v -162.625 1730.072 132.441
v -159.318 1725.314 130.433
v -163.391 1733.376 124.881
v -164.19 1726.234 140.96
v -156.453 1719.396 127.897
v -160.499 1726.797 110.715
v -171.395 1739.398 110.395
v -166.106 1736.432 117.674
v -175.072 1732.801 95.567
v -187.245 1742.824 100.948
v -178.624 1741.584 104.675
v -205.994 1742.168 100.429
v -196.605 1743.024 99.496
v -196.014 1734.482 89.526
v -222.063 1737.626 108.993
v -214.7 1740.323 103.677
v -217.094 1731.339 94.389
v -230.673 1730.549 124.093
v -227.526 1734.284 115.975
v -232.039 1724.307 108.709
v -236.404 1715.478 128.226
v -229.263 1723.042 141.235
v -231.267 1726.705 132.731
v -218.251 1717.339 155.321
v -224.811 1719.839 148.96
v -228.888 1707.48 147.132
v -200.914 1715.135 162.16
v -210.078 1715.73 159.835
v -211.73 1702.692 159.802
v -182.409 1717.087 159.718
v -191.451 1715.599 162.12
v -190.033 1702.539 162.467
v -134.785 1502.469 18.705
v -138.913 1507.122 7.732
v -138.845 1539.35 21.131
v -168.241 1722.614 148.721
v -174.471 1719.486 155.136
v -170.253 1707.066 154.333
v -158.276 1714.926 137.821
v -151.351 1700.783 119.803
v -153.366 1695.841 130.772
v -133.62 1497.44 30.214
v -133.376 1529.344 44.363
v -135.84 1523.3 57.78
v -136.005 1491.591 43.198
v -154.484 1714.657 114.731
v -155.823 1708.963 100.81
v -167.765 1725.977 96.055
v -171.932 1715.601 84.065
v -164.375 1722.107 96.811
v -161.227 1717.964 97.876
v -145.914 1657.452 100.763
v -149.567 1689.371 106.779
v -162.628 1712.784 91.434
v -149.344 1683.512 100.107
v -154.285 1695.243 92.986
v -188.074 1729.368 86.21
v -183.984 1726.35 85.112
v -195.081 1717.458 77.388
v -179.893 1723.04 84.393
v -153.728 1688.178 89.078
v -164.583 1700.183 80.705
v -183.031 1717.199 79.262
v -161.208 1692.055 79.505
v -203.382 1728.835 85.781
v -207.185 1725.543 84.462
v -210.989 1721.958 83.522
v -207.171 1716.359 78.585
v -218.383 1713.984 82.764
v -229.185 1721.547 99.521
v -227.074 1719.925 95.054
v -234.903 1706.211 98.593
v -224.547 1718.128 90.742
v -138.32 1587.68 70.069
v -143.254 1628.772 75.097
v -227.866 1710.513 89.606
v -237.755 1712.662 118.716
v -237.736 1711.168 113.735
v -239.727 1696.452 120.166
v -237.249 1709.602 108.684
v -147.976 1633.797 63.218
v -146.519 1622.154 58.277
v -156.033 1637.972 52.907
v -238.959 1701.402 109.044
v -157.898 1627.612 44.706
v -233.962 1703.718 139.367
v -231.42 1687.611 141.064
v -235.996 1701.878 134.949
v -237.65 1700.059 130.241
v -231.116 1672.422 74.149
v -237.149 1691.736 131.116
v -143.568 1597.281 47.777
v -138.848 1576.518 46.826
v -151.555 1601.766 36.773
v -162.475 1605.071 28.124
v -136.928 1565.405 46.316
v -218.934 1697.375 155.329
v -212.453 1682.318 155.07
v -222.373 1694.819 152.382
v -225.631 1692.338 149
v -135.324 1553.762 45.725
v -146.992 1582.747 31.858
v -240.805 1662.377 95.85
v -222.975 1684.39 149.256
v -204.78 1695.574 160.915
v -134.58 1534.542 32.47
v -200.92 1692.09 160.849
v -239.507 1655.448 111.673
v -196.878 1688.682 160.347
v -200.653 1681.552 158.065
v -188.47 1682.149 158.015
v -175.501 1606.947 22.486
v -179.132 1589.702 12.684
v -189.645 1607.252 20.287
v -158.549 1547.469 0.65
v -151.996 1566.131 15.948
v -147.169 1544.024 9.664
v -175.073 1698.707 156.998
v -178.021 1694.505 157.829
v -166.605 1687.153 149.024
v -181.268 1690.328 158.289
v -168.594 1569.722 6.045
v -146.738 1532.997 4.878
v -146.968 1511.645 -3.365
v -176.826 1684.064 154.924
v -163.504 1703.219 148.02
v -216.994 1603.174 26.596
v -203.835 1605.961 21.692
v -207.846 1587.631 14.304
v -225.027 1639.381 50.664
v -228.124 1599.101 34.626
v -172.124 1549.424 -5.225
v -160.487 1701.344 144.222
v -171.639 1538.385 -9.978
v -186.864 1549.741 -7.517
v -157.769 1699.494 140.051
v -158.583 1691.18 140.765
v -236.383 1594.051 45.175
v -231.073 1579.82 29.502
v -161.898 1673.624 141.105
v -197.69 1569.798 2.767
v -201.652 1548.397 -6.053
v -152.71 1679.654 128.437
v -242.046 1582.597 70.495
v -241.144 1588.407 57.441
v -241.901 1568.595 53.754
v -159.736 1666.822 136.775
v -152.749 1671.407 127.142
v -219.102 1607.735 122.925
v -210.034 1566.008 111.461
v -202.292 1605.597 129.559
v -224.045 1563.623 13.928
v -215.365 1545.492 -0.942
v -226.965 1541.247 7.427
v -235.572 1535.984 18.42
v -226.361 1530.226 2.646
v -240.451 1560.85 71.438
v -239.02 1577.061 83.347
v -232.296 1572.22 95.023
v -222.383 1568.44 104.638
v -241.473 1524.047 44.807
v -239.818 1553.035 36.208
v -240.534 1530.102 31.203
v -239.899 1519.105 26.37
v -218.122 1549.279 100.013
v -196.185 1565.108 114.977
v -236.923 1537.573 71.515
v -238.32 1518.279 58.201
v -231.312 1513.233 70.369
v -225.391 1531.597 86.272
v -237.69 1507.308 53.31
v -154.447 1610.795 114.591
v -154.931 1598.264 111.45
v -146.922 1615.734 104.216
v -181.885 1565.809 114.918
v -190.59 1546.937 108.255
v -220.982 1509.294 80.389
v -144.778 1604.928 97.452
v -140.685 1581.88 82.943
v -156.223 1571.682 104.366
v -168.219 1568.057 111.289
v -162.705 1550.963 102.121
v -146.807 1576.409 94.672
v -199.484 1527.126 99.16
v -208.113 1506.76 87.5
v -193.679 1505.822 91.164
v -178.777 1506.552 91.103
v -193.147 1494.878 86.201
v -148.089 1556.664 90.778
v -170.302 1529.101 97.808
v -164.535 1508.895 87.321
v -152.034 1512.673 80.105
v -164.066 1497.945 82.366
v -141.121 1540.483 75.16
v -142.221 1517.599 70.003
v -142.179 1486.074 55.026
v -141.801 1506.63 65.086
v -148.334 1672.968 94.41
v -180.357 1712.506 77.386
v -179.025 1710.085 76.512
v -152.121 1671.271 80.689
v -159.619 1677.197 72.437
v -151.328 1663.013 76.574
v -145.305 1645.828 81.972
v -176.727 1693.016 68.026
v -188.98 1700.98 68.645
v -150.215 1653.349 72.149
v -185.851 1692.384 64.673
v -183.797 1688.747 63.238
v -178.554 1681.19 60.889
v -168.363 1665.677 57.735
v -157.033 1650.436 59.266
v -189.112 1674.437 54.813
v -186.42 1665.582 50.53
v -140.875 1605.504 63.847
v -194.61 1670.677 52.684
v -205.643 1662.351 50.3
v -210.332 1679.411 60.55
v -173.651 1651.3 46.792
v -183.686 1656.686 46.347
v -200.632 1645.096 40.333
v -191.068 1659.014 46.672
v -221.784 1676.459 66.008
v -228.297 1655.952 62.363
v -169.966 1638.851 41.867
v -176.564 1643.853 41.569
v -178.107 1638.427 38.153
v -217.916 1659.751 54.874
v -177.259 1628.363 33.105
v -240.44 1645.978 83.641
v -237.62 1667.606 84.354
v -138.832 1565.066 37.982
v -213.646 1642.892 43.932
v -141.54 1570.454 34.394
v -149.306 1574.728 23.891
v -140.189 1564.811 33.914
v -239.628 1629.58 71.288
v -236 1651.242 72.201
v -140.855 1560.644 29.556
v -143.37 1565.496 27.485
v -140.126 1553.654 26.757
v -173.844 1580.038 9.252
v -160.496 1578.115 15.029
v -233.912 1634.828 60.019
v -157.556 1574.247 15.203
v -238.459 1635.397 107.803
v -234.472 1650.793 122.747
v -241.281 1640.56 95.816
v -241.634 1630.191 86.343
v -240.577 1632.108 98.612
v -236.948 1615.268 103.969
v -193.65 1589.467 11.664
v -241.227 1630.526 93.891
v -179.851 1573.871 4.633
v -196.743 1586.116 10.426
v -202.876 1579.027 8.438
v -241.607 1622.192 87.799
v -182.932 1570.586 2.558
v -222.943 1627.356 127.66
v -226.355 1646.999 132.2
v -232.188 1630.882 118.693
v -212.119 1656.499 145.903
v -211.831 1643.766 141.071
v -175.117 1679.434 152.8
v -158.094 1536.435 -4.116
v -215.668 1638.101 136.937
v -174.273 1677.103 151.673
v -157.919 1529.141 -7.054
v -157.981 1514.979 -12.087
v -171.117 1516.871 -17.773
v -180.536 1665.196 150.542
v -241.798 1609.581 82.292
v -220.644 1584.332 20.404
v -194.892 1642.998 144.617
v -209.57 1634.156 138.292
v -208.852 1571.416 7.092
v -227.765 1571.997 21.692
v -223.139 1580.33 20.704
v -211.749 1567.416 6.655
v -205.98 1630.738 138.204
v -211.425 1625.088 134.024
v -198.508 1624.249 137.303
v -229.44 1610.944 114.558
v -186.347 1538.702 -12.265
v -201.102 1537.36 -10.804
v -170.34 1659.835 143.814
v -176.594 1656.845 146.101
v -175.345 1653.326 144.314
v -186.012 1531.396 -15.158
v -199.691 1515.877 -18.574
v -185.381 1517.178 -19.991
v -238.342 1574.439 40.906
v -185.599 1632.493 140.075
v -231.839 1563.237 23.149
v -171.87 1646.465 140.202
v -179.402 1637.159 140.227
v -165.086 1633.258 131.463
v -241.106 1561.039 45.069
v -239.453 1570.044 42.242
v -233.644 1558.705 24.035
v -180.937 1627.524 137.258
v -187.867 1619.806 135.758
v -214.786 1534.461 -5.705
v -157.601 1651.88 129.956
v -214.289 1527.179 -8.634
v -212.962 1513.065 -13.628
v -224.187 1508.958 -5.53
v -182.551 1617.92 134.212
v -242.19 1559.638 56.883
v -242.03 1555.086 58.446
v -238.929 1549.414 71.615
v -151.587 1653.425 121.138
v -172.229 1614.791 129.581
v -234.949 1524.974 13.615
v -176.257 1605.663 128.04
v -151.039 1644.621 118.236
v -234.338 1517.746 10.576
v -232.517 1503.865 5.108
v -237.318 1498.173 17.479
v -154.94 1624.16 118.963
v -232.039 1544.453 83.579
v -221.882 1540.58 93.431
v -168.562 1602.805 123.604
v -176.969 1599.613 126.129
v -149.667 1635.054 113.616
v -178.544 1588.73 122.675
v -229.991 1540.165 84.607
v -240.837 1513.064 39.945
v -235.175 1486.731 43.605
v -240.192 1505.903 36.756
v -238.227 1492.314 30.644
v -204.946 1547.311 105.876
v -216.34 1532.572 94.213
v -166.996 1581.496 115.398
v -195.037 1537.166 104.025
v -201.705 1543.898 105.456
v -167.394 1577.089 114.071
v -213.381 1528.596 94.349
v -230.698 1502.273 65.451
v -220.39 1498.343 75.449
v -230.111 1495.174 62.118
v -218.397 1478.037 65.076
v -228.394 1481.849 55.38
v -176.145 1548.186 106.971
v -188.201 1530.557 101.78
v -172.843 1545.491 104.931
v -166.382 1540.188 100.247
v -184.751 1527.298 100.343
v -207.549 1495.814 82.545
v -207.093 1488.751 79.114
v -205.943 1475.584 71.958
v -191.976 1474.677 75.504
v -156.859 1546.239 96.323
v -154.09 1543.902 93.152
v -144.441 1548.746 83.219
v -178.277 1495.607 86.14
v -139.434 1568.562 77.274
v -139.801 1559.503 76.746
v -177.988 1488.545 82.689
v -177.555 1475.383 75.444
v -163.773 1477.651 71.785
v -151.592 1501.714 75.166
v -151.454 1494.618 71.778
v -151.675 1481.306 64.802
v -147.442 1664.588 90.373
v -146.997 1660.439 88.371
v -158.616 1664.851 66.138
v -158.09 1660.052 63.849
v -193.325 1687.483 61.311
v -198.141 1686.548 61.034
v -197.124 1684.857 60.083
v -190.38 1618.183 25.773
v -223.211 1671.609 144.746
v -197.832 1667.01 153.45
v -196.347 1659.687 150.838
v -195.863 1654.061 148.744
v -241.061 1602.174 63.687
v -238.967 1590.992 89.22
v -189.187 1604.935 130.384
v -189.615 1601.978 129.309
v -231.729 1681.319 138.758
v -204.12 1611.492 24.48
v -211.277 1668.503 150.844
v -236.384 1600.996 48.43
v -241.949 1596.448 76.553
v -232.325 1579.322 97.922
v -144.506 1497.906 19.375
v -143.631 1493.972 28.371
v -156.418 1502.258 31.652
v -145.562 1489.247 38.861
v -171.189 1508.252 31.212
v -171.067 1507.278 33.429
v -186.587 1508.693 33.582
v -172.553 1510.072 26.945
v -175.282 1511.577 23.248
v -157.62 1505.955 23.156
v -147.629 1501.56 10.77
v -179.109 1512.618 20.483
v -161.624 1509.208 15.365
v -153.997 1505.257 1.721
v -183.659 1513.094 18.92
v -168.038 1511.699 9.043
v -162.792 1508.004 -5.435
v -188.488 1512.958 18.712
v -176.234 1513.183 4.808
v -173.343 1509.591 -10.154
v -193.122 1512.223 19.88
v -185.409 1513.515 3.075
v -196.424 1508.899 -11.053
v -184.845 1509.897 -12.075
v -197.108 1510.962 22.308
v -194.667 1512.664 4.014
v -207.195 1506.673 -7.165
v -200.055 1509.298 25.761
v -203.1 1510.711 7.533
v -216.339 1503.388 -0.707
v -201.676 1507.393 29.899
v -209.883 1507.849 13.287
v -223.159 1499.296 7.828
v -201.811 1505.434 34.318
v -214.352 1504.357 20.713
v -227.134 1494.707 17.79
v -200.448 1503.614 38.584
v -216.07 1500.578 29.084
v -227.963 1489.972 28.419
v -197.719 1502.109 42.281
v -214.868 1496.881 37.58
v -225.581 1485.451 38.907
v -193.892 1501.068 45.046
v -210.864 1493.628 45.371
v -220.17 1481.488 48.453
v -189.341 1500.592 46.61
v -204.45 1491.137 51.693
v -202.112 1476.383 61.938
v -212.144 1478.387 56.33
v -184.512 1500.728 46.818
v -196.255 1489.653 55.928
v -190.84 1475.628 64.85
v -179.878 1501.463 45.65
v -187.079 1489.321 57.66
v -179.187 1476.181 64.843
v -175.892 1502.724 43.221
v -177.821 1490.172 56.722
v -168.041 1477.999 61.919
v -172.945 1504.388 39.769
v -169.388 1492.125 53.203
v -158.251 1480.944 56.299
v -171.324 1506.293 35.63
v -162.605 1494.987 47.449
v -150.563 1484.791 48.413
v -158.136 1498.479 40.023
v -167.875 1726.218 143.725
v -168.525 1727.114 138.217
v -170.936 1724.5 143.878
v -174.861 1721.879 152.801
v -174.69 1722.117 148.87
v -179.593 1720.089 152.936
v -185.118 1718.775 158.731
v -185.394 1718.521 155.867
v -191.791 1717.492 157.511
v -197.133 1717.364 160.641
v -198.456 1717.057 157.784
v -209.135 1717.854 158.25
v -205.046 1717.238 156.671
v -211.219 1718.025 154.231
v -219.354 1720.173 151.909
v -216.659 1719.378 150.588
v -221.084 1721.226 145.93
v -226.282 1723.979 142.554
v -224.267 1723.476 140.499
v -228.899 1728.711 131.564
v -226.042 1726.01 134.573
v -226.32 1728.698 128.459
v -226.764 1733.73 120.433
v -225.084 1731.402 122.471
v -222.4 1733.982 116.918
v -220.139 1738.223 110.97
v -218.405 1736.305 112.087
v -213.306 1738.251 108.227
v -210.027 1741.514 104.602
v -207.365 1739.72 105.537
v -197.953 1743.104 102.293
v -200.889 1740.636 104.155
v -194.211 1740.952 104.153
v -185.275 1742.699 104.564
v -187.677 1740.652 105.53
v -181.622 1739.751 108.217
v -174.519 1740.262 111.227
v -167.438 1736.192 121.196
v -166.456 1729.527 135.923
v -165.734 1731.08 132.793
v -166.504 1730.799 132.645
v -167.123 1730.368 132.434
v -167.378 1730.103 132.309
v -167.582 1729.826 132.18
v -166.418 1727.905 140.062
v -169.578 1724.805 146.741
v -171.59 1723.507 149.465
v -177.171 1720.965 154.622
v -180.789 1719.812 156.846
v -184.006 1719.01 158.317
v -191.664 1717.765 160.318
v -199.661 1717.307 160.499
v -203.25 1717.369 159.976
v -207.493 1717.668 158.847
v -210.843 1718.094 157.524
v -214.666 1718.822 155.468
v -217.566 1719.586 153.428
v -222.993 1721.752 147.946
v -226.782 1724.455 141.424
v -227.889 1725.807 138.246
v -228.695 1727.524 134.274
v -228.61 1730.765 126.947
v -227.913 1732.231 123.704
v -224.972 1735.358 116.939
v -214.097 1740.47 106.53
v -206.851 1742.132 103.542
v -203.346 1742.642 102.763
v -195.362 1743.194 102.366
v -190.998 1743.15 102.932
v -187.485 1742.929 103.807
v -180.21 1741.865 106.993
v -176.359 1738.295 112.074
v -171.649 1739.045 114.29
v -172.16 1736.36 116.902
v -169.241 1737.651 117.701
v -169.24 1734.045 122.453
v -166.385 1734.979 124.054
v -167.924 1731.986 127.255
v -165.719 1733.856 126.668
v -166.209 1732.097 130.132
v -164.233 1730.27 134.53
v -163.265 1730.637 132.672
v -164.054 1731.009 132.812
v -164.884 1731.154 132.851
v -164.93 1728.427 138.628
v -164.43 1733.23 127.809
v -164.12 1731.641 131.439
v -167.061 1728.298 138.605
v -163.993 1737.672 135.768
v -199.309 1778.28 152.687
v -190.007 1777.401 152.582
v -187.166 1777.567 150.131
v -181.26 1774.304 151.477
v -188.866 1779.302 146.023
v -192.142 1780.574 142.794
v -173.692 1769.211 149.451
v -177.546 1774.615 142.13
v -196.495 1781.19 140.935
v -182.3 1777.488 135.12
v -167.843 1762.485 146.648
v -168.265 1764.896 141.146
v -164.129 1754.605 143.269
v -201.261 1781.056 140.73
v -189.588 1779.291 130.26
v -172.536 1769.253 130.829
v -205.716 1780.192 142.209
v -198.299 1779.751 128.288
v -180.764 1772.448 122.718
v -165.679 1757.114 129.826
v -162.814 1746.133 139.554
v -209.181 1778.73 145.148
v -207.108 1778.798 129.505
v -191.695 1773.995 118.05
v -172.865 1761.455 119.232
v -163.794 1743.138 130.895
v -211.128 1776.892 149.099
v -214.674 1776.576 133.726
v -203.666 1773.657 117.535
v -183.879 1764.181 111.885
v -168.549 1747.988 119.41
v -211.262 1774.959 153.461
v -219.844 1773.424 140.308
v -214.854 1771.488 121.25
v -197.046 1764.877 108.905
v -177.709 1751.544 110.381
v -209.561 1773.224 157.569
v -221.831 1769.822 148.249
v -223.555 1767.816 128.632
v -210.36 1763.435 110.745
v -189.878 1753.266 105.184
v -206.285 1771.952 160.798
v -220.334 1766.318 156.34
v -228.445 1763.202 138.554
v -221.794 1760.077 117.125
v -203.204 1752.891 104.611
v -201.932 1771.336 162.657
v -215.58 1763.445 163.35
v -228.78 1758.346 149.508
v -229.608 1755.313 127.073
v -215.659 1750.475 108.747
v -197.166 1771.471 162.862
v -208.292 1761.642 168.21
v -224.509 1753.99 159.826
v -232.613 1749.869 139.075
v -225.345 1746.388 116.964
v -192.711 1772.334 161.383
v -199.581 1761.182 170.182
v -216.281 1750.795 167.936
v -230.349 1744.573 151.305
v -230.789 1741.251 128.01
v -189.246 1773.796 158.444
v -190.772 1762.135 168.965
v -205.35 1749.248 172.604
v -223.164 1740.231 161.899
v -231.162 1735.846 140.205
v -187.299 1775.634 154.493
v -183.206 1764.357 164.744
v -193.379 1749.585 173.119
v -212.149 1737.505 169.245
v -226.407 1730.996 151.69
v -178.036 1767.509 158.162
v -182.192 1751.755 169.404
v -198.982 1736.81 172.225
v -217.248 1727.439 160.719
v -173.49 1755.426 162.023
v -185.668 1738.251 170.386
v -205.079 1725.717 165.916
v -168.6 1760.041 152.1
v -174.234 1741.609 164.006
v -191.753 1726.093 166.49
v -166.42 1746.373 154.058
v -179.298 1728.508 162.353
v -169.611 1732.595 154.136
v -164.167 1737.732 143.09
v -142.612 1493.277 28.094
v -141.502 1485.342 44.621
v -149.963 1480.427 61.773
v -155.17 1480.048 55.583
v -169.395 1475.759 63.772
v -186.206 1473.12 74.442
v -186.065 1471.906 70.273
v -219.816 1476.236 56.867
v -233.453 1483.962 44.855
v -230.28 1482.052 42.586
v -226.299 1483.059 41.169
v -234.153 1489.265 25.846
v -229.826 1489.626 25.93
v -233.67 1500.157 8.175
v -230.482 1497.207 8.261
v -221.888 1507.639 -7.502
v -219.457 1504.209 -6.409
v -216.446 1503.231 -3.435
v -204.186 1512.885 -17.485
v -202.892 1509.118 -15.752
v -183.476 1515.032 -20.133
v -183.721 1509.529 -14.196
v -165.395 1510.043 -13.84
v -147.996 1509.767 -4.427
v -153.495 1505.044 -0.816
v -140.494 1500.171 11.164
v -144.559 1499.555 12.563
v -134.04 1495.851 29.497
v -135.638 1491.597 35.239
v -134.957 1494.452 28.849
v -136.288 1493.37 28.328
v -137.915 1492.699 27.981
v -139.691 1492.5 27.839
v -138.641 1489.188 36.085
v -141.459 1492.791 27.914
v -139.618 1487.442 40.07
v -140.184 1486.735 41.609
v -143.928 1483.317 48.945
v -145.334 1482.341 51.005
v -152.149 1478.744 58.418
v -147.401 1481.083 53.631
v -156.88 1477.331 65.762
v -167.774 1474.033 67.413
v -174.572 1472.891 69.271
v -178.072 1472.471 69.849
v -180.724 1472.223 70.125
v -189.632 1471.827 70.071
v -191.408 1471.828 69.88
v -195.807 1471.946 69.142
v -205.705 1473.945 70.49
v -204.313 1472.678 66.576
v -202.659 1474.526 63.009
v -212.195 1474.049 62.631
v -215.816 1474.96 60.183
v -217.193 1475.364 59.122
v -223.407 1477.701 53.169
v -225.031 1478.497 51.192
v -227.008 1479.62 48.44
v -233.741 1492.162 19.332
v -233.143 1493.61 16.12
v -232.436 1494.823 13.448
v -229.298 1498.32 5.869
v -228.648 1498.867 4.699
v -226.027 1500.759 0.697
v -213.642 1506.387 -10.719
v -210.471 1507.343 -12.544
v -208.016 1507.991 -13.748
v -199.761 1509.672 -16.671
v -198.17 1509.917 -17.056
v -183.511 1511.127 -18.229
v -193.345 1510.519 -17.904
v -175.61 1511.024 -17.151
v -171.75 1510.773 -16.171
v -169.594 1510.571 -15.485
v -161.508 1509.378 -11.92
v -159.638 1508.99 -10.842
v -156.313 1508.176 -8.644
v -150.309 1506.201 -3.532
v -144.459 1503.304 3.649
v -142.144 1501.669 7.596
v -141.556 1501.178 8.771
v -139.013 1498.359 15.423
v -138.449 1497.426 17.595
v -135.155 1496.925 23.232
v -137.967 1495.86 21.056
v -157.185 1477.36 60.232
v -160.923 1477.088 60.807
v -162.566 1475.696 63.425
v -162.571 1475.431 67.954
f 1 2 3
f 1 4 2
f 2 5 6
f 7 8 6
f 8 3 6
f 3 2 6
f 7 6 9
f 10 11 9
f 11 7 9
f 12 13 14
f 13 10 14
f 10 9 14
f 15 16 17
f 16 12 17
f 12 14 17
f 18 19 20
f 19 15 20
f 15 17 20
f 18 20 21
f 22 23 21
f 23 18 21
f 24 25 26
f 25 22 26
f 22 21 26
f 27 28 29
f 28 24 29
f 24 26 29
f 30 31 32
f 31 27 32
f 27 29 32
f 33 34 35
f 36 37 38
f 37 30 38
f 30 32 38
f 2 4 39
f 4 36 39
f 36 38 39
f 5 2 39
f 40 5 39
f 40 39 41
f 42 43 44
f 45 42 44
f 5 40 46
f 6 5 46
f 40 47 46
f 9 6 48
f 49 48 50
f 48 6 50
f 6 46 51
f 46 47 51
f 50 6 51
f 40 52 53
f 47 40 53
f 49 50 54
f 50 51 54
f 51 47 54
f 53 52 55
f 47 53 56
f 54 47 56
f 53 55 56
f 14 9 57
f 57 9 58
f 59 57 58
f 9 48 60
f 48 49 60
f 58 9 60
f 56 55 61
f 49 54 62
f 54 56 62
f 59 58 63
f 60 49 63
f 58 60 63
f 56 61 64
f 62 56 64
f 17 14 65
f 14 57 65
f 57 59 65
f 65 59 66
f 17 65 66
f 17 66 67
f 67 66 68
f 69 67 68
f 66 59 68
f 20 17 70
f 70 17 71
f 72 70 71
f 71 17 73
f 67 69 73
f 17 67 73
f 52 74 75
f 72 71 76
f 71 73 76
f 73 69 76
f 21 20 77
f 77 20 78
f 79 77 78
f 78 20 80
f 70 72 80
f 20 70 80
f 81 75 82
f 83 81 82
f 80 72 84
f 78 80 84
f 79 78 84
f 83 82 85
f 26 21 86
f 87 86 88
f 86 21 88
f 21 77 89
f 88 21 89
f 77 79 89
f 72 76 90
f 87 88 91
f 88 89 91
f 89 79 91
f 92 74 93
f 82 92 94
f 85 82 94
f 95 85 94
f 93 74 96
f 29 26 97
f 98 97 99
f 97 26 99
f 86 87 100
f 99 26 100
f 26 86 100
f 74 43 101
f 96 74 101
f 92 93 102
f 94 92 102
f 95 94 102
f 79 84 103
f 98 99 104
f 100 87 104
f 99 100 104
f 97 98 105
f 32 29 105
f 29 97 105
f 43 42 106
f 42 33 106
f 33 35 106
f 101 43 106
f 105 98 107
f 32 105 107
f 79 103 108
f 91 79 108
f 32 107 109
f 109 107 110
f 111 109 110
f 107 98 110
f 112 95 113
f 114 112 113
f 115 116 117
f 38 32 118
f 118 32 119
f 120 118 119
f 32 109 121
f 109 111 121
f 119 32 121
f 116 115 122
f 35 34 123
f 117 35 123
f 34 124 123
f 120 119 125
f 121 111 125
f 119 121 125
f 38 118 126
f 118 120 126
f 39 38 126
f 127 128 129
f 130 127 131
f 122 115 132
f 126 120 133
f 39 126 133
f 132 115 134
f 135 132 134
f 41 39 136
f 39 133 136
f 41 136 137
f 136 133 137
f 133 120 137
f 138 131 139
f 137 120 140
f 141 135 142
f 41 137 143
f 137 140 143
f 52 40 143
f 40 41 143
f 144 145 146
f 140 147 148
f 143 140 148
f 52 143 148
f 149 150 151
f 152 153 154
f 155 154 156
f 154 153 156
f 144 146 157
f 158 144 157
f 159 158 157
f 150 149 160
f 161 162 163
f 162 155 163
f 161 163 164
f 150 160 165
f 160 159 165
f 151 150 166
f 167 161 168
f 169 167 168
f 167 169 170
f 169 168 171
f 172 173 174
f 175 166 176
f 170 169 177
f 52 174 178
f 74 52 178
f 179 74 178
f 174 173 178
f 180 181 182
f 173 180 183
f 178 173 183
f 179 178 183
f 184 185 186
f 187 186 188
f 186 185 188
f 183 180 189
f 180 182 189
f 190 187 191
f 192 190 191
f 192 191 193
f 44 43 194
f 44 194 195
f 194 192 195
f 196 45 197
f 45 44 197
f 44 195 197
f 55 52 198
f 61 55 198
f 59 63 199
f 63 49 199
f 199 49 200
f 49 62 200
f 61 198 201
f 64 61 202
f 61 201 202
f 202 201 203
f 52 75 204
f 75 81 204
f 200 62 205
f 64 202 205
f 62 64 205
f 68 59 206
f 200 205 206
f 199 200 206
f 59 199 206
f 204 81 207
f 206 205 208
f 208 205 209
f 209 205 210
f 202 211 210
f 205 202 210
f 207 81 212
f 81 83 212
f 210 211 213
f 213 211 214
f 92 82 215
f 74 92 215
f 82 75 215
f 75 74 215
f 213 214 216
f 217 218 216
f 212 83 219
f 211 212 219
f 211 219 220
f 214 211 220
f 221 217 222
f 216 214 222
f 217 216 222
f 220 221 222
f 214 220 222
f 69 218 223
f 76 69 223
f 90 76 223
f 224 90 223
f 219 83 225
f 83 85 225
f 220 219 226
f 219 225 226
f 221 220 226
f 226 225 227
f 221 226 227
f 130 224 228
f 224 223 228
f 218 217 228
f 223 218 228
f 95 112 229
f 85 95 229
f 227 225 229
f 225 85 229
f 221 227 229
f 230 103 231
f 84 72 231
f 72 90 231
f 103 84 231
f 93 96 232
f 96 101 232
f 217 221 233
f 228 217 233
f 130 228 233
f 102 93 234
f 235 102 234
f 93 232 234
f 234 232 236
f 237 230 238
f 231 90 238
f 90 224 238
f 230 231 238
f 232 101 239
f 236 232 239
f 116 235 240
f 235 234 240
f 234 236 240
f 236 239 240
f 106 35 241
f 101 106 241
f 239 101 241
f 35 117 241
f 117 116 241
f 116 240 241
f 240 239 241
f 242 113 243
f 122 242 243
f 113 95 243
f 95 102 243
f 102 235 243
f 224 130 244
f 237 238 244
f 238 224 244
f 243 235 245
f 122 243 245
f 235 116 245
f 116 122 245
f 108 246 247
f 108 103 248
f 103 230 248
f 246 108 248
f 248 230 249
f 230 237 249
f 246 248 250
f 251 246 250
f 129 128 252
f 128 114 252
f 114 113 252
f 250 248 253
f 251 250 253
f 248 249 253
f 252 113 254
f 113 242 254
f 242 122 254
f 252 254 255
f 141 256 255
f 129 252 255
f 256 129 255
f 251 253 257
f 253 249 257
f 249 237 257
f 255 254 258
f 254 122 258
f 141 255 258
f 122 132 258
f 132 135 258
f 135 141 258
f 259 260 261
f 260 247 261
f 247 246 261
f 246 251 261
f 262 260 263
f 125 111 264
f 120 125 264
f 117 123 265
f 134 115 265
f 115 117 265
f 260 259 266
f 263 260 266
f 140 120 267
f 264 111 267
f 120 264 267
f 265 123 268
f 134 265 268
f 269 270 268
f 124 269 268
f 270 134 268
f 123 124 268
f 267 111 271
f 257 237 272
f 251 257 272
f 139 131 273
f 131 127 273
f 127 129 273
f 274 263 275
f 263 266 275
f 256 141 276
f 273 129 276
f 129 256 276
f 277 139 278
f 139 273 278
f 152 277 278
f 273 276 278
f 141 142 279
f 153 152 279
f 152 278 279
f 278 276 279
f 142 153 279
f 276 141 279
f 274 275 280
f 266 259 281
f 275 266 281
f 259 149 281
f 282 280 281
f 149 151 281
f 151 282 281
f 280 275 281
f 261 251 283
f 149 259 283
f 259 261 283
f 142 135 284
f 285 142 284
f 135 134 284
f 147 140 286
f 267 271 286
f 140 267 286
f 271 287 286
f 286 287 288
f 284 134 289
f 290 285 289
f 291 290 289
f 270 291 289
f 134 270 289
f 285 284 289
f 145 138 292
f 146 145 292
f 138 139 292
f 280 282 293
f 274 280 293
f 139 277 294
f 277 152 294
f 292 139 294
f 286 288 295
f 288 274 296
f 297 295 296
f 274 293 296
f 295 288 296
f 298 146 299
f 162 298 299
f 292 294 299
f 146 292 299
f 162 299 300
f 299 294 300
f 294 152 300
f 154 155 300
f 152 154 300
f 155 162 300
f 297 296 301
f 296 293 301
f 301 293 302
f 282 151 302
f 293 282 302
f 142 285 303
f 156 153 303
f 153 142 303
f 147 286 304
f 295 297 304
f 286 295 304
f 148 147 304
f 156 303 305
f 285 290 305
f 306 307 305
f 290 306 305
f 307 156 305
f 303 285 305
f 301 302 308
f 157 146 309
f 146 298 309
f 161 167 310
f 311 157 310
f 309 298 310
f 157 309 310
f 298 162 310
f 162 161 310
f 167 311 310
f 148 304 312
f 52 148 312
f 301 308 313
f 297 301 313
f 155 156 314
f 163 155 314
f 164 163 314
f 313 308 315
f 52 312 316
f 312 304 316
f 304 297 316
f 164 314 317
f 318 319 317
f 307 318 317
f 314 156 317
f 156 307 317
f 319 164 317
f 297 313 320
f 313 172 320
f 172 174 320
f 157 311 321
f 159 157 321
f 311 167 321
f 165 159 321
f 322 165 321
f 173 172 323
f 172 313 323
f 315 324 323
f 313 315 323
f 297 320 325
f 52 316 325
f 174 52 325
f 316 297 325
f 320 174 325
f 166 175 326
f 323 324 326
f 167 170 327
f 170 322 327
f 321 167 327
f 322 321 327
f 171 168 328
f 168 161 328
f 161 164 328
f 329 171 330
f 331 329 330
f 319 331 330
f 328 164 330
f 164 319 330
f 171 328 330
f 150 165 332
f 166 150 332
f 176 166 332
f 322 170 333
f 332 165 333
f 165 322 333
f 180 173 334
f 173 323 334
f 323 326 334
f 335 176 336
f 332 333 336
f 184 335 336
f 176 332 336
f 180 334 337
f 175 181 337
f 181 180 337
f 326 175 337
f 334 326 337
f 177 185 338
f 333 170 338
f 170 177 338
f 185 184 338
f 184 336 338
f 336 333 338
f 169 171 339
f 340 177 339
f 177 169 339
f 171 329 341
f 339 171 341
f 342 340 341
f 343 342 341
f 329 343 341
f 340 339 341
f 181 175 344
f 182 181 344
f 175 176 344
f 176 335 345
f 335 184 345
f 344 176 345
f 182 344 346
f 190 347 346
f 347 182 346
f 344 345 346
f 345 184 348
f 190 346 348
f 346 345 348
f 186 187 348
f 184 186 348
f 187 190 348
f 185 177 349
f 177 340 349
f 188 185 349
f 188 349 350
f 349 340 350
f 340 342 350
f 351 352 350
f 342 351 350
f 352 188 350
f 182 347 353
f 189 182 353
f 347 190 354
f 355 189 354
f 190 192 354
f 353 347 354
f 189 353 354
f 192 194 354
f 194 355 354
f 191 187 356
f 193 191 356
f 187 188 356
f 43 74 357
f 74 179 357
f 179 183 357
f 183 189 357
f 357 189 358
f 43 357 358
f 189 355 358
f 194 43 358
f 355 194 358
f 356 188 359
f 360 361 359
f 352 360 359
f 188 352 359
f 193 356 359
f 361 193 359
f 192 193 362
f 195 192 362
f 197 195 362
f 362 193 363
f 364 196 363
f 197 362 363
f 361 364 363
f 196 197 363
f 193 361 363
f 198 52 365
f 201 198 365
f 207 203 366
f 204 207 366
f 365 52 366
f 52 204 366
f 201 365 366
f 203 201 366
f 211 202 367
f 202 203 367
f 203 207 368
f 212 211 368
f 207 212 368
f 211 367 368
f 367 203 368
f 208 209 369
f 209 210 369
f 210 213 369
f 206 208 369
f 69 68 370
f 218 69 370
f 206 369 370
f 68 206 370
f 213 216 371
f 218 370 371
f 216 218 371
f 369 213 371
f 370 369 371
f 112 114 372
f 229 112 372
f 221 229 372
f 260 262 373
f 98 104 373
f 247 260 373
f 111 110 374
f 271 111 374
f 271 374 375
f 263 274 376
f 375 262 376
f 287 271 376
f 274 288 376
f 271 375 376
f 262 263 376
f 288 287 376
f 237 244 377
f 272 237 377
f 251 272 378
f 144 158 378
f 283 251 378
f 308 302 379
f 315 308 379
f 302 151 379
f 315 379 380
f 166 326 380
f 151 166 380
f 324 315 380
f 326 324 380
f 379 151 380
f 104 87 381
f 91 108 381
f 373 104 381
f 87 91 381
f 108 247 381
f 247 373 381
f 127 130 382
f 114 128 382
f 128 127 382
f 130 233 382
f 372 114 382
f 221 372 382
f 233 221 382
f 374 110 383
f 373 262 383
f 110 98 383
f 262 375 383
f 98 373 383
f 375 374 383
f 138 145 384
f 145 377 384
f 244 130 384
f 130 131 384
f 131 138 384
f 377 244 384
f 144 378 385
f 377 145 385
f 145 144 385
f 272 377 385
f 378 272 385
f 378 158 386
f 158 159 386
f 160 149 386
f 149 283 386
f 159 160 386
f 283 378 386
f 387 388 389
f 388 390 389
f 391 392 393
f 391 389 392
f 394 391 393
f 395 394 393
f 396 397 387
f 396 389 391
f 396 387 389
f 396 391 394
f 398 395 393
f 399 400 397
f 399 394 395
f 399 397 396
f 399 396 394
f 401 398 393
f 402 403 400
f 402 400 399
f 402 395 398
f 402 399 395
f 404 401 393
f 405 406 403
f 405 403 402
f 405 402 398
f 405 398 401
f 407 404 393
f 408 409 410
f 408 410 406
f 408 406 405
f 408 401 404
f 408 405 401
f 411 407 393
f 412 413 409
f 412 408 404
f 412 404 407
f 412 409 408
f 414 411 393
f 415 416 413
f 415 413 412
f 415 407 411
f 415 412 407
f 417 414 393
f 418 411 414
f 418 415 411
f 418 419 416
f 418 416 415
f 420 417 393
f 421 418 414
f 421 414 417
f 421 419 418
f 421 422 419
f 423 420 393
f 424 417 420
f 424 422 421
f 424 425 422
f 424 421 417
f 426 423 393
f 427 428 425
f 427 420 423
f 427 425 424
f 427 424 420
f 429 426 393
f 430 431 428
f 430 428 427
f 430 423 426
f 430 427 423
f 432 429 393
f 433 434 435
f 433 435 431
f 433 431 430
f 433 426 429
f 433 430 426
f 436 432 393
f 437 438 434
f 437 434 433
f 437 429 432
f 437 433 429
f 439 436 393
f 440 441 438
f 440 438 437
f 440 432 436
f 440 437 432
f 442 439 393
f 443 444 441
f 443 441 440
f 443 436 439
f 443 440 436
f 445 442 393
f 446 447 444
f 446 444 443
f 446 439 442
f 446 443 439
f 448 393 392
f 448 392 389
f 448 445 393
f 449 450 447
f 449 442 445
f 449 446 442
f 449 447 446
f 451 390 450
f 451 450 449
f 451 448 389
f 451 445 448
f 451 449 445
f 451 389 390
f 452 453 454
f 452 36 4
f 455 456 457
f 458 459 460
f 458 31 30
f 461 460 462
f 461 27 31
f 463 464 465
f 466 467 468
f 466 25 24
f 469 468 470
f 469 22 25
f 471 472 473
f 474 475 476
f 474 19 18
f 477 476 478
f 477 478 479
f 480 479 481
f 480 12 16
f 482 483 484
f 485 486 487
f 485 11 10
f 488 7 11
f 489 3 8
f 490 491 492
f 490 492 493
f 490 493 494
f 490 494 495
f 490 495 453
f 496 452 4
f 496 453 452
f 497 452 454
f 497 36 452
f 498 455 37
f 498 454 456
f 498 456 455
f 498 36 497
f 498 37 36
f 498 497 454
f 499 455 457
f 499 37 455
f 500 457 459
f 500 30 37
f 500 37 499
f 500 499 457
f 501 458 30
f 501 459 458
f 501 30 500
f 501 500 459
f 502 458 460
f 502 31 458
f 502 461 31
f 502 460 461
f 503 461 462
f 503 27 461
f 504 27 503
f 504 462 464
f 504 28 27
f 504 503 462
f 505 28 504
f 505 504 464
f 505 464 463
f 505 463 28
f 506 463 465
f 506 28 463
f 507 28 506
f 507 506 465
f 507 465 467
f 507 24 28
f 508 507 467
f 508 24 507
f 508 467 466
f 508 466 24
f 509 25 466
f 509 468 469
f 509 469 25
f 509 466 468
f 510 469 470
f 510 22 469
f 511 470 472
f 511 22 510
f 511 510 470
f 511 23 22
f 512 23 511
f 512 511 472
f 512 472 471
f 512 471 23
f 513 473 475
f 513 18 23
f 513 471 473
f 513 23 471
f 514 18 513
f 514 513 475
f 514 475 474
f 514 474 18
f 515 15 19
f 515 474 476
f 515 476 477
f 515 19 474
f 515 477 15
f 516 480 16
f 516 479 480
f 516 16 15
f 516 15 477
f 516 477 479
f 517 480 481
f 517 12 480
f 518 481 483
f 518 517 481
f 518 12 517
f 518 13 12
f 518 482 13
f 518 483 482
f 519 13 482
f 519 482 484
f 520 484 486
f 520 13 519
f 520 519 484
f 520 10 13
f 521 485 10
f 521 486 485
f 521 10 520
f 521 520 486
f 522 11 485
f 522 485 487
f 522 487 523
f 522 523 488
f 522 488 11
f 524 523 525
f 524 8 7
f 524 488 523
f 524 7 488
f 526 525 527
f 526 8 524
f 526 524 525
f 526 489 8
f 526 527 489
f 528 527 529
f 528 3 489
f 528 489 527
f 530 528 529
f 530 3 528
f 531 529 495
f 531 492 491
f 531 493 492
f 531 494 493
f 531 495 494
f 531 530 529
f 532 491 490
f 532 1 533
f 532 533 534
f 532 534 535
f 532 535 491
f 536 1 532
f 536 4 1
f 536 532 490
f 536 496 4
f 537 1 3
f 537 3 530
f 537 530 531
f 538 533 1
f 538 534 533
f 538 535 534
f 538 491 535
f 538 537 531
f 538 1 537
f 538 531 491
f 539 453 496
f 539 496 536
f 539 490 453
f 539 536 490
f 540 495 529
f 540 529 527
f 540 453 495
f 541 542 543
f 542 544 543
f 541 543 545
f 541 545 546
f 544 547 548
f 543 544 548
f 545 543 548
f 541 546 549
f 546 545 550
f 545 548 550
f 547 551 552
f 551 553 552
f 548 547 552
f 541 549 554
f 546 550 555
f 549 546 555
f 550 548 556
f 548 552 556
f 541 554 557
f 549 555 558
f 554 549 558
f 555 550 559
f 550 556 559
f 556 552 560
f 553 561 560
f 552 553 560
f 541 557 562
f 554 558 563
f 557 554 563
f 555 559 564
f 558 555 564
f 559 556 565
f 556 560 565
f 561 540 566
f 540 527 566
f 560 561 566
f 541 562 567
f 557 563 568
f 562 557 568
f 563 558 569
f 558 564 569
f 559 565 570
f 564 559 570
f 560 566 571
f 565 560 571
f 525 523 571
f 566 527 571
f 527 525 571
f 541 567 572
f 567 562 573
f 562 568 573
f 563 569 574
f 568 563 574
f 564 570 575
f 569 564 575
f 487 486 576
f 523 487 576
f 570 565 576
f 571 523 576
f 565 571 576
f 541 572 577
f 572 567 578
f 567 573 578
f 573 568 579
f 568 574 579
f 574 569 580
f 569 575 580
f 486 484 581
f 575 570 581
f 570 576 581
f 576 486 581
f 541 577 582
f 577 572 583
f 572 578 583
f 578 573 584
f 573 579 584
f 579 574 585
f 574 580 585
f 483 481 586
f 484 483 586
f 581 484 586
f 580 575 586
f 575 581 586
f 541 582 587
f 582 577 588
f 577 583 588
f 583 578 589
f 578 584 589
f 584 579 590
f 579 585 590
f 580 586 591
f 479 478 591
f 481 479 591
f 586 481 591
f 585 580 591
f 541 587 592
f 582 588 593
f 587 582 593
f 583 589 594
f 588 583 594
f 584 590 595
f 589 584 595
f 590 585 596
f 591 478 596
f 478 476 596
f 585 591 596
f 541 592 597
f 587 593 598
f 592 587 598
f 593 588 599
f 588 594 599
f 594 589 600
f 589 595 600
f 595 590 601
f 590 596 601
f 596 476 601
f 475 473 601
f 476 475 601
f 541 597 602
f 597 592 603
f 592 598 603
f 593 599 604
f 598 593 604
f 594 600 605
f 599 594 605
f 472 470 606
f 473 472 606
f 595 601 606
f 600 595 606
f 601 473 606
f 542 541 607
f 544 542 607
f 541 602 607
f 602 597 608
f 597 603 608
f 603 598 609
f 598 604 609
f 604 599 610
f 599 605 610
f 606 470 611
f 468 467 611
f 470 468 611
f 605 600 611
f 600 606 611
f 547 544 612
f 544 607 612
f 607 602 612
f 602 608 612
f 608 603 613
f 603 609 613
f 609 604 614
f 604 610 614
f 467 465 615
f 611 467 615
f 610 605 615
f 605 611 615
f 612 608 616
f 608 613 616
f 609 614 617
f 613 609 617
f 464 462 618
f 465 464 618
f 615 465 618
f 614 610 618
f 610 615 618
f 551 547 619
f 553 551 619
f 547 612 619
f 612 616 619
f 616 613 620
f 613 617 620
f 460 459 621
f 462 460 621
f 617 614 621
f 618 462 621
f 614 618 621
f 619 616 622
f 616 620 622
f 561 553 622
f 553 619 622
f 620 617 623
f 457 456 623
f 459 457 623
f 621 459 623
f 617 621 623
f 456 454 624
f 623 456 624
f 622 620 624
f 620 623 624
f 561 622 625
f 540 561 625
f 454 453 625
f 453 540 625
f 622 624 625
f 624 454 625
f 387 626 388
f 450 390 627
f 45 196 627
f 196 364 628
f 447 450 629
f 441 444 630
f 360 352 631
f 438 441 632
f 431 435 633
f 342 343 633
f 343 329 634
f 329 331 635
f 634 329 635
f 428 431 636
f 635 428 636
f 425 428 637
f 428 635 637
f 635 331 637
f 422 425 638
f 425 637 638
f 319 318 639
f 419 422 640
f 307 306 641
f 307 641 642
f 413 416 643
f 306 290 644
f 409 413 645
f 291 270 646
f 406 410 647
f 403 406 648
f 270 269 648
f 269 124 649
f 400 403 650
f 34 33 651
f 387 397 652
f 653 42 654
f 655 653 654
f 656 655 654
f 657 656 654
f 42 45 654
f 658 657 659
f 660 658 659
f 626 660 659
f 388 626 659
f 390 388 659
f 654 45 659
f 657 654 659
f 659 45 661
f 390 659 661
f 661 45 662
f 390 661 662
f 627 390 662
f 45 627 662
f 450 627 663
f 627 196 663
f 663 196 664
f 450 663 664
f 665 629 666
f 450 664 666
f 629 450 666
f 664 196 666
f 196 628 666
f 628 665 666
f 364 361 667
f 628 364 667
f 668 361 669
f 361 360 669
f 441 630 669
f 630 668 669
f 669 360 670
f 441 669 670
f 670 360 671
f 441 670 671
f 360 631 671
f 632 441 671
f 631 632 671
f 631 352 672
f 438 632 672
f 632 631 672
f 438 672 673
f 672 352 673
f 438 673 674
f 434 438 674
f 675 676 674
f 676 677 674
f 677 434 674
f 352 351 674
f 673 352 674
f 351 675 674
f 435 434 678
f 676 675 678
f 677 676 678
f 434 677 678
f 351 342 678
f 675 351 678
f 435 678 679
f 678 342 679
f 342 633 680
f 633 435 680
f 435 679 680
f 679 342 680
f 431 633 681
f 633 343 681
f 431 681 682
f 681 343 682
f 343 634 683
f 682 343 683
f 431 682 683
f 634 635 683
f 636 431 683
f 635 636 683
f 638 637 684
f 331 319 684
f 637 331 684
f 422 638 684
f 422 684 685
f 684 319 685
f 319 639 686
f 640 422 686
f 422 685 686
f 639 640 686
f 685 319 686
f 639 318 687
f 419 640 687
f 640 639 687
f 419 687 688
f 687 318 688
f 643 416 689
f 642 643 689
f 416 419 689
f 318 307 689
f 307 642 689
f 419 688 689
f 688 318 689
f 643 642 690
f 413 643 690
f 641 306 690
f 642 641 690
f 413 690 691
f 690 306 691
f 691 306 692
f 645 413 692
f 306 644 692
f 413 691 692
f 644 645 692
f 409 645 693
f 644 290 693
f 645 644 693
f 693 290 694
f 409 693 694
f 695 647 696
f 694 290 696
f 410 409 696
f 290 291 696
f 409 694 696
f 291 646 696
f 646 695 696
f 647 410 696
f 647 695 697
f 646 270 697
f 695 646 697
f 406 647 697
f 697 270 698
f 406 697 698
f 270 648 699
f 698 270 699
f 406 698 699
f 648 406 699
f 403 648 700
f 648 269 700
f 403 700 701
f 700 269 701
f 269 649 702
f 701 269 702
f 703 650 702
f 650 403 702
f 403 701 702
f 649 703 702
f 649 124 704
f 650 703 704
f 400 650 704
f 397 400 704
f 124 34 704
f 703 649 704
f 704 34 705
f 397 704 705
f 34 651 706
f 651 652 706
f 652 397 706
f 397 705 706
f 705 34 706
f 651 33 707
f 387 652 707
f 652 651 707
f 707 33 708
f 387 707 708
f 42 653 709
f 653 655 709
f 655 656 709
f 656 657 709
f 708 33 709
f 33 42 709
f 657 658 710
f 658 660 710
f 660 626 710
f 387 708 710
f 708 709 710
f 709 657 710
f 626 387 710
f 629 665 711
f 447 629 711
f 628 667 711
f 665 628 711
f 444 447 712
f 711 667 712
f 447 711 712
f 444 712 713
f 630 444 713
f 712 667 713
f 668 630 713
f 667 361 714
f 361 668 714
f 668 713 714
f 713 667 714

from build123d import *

# Parameters (mm, degrees)
FILLET064_R             = 6
FILLET065_R             = 3
BODY040_ROLL_ANGLE      = 177.30561
BODY040_PITCH_ANGLE     = -23.812555
BODY040_PLACEMENT_ANGLE = 92.701681


with BuildPart() as part:
    # Sketch135 → Revolution070 (revolve)
    with BuildSketch(Plane.XY):
        with BuildLine():
            Line((15.9442, 0), (306.848053, 0))
            add(Edge.make_bspline(
                [(306.848053, 0), (324.317413, 42.311157), (231.745069, 46.553256), (127.654996, 54.056504), (-18.918443, 56.908137), (15.9442, 0)],
                knots=[0, 0, 0, 0, 0.333333, 0.666667, 1, 1, 1, 1], degree=3))
        make_face()
    revolve(axis=Axis((0, 0, 0), (1, 0, 0)))

    # Sketch136 → Groove063 (revolve, cut)
    with BuildSketch(Plane.XY):
        with BuildLine():
            Line((-60, 0), (60, 0))
            ThreePointArc((60, 0), (0, 60), (-60, 0))
        make_face()
    revolve(axis=Axis((0, 0, 0), (1, 0, 0)), mode=Mode.SUBTRACT)

    # Fillet064
    fillet064_edges = [part.edges().sort_by_distance(p)[0] for p in [
        (33.106232, -50.039758, 0),
    ]]
    fillet(fillet064_edges, radius=FILLET064_R)

    # Sketch137 → Groove064 (revolve, cut)
    with BuildSketch(Plane.XY):
        with BuildLine():
            Line((285, 0), (355, 0))
            ThreePointArc((355, 0), (320, 35), (285, 0))
        make_face()
    revolve(axis=Axis((0, 0, 0), (1, 0, 0)), mode=Mode.SUBTRACT)

    # Fillet065
    fillet065_edges = [part.edges().sort_by_distance(p)[0] for p in [
        (304.668851, -31.463564, 0),
    ]]
    fillet(fillet065_edges, radius=FILLET065_R)

    # Sketch137 → Revolution071 (revolve)
    with BuildSketch(Plane.XY):
        with BuildLine():
            Line((285, 0), (355, 0))
            ThreePointArc((355, 0), (320, 35), (285, 0))
        make_face()
    revolve(axis=Axis((0, 0, 0), (1, 0, 0)))


with BuildPart() as part_1:
    # Body040 roll: moved
    add(part.part.rotate(Axis((0, 0, 0), (1, 0, 0)), BODY040_ROLL_ANGLE))


with BuildPart() as part_2:
    # Body040 pitch: moved
    add(part_1.part.rotate(Axis((0, 0, 0), (0, 1, 0)), BODY040_PITCH_ANGLE))


with BuildPart() as part_3:
    # Body040 placement: moved
    add(part_2.part.moved(Location((-184, 1453.861755, 9.357312))).rotate(Axis((-184, 1453.861755, 9.357312), (0, 0, 1)), BODY040_PLACEMENT_ANGLE))


solid = part_3.part
